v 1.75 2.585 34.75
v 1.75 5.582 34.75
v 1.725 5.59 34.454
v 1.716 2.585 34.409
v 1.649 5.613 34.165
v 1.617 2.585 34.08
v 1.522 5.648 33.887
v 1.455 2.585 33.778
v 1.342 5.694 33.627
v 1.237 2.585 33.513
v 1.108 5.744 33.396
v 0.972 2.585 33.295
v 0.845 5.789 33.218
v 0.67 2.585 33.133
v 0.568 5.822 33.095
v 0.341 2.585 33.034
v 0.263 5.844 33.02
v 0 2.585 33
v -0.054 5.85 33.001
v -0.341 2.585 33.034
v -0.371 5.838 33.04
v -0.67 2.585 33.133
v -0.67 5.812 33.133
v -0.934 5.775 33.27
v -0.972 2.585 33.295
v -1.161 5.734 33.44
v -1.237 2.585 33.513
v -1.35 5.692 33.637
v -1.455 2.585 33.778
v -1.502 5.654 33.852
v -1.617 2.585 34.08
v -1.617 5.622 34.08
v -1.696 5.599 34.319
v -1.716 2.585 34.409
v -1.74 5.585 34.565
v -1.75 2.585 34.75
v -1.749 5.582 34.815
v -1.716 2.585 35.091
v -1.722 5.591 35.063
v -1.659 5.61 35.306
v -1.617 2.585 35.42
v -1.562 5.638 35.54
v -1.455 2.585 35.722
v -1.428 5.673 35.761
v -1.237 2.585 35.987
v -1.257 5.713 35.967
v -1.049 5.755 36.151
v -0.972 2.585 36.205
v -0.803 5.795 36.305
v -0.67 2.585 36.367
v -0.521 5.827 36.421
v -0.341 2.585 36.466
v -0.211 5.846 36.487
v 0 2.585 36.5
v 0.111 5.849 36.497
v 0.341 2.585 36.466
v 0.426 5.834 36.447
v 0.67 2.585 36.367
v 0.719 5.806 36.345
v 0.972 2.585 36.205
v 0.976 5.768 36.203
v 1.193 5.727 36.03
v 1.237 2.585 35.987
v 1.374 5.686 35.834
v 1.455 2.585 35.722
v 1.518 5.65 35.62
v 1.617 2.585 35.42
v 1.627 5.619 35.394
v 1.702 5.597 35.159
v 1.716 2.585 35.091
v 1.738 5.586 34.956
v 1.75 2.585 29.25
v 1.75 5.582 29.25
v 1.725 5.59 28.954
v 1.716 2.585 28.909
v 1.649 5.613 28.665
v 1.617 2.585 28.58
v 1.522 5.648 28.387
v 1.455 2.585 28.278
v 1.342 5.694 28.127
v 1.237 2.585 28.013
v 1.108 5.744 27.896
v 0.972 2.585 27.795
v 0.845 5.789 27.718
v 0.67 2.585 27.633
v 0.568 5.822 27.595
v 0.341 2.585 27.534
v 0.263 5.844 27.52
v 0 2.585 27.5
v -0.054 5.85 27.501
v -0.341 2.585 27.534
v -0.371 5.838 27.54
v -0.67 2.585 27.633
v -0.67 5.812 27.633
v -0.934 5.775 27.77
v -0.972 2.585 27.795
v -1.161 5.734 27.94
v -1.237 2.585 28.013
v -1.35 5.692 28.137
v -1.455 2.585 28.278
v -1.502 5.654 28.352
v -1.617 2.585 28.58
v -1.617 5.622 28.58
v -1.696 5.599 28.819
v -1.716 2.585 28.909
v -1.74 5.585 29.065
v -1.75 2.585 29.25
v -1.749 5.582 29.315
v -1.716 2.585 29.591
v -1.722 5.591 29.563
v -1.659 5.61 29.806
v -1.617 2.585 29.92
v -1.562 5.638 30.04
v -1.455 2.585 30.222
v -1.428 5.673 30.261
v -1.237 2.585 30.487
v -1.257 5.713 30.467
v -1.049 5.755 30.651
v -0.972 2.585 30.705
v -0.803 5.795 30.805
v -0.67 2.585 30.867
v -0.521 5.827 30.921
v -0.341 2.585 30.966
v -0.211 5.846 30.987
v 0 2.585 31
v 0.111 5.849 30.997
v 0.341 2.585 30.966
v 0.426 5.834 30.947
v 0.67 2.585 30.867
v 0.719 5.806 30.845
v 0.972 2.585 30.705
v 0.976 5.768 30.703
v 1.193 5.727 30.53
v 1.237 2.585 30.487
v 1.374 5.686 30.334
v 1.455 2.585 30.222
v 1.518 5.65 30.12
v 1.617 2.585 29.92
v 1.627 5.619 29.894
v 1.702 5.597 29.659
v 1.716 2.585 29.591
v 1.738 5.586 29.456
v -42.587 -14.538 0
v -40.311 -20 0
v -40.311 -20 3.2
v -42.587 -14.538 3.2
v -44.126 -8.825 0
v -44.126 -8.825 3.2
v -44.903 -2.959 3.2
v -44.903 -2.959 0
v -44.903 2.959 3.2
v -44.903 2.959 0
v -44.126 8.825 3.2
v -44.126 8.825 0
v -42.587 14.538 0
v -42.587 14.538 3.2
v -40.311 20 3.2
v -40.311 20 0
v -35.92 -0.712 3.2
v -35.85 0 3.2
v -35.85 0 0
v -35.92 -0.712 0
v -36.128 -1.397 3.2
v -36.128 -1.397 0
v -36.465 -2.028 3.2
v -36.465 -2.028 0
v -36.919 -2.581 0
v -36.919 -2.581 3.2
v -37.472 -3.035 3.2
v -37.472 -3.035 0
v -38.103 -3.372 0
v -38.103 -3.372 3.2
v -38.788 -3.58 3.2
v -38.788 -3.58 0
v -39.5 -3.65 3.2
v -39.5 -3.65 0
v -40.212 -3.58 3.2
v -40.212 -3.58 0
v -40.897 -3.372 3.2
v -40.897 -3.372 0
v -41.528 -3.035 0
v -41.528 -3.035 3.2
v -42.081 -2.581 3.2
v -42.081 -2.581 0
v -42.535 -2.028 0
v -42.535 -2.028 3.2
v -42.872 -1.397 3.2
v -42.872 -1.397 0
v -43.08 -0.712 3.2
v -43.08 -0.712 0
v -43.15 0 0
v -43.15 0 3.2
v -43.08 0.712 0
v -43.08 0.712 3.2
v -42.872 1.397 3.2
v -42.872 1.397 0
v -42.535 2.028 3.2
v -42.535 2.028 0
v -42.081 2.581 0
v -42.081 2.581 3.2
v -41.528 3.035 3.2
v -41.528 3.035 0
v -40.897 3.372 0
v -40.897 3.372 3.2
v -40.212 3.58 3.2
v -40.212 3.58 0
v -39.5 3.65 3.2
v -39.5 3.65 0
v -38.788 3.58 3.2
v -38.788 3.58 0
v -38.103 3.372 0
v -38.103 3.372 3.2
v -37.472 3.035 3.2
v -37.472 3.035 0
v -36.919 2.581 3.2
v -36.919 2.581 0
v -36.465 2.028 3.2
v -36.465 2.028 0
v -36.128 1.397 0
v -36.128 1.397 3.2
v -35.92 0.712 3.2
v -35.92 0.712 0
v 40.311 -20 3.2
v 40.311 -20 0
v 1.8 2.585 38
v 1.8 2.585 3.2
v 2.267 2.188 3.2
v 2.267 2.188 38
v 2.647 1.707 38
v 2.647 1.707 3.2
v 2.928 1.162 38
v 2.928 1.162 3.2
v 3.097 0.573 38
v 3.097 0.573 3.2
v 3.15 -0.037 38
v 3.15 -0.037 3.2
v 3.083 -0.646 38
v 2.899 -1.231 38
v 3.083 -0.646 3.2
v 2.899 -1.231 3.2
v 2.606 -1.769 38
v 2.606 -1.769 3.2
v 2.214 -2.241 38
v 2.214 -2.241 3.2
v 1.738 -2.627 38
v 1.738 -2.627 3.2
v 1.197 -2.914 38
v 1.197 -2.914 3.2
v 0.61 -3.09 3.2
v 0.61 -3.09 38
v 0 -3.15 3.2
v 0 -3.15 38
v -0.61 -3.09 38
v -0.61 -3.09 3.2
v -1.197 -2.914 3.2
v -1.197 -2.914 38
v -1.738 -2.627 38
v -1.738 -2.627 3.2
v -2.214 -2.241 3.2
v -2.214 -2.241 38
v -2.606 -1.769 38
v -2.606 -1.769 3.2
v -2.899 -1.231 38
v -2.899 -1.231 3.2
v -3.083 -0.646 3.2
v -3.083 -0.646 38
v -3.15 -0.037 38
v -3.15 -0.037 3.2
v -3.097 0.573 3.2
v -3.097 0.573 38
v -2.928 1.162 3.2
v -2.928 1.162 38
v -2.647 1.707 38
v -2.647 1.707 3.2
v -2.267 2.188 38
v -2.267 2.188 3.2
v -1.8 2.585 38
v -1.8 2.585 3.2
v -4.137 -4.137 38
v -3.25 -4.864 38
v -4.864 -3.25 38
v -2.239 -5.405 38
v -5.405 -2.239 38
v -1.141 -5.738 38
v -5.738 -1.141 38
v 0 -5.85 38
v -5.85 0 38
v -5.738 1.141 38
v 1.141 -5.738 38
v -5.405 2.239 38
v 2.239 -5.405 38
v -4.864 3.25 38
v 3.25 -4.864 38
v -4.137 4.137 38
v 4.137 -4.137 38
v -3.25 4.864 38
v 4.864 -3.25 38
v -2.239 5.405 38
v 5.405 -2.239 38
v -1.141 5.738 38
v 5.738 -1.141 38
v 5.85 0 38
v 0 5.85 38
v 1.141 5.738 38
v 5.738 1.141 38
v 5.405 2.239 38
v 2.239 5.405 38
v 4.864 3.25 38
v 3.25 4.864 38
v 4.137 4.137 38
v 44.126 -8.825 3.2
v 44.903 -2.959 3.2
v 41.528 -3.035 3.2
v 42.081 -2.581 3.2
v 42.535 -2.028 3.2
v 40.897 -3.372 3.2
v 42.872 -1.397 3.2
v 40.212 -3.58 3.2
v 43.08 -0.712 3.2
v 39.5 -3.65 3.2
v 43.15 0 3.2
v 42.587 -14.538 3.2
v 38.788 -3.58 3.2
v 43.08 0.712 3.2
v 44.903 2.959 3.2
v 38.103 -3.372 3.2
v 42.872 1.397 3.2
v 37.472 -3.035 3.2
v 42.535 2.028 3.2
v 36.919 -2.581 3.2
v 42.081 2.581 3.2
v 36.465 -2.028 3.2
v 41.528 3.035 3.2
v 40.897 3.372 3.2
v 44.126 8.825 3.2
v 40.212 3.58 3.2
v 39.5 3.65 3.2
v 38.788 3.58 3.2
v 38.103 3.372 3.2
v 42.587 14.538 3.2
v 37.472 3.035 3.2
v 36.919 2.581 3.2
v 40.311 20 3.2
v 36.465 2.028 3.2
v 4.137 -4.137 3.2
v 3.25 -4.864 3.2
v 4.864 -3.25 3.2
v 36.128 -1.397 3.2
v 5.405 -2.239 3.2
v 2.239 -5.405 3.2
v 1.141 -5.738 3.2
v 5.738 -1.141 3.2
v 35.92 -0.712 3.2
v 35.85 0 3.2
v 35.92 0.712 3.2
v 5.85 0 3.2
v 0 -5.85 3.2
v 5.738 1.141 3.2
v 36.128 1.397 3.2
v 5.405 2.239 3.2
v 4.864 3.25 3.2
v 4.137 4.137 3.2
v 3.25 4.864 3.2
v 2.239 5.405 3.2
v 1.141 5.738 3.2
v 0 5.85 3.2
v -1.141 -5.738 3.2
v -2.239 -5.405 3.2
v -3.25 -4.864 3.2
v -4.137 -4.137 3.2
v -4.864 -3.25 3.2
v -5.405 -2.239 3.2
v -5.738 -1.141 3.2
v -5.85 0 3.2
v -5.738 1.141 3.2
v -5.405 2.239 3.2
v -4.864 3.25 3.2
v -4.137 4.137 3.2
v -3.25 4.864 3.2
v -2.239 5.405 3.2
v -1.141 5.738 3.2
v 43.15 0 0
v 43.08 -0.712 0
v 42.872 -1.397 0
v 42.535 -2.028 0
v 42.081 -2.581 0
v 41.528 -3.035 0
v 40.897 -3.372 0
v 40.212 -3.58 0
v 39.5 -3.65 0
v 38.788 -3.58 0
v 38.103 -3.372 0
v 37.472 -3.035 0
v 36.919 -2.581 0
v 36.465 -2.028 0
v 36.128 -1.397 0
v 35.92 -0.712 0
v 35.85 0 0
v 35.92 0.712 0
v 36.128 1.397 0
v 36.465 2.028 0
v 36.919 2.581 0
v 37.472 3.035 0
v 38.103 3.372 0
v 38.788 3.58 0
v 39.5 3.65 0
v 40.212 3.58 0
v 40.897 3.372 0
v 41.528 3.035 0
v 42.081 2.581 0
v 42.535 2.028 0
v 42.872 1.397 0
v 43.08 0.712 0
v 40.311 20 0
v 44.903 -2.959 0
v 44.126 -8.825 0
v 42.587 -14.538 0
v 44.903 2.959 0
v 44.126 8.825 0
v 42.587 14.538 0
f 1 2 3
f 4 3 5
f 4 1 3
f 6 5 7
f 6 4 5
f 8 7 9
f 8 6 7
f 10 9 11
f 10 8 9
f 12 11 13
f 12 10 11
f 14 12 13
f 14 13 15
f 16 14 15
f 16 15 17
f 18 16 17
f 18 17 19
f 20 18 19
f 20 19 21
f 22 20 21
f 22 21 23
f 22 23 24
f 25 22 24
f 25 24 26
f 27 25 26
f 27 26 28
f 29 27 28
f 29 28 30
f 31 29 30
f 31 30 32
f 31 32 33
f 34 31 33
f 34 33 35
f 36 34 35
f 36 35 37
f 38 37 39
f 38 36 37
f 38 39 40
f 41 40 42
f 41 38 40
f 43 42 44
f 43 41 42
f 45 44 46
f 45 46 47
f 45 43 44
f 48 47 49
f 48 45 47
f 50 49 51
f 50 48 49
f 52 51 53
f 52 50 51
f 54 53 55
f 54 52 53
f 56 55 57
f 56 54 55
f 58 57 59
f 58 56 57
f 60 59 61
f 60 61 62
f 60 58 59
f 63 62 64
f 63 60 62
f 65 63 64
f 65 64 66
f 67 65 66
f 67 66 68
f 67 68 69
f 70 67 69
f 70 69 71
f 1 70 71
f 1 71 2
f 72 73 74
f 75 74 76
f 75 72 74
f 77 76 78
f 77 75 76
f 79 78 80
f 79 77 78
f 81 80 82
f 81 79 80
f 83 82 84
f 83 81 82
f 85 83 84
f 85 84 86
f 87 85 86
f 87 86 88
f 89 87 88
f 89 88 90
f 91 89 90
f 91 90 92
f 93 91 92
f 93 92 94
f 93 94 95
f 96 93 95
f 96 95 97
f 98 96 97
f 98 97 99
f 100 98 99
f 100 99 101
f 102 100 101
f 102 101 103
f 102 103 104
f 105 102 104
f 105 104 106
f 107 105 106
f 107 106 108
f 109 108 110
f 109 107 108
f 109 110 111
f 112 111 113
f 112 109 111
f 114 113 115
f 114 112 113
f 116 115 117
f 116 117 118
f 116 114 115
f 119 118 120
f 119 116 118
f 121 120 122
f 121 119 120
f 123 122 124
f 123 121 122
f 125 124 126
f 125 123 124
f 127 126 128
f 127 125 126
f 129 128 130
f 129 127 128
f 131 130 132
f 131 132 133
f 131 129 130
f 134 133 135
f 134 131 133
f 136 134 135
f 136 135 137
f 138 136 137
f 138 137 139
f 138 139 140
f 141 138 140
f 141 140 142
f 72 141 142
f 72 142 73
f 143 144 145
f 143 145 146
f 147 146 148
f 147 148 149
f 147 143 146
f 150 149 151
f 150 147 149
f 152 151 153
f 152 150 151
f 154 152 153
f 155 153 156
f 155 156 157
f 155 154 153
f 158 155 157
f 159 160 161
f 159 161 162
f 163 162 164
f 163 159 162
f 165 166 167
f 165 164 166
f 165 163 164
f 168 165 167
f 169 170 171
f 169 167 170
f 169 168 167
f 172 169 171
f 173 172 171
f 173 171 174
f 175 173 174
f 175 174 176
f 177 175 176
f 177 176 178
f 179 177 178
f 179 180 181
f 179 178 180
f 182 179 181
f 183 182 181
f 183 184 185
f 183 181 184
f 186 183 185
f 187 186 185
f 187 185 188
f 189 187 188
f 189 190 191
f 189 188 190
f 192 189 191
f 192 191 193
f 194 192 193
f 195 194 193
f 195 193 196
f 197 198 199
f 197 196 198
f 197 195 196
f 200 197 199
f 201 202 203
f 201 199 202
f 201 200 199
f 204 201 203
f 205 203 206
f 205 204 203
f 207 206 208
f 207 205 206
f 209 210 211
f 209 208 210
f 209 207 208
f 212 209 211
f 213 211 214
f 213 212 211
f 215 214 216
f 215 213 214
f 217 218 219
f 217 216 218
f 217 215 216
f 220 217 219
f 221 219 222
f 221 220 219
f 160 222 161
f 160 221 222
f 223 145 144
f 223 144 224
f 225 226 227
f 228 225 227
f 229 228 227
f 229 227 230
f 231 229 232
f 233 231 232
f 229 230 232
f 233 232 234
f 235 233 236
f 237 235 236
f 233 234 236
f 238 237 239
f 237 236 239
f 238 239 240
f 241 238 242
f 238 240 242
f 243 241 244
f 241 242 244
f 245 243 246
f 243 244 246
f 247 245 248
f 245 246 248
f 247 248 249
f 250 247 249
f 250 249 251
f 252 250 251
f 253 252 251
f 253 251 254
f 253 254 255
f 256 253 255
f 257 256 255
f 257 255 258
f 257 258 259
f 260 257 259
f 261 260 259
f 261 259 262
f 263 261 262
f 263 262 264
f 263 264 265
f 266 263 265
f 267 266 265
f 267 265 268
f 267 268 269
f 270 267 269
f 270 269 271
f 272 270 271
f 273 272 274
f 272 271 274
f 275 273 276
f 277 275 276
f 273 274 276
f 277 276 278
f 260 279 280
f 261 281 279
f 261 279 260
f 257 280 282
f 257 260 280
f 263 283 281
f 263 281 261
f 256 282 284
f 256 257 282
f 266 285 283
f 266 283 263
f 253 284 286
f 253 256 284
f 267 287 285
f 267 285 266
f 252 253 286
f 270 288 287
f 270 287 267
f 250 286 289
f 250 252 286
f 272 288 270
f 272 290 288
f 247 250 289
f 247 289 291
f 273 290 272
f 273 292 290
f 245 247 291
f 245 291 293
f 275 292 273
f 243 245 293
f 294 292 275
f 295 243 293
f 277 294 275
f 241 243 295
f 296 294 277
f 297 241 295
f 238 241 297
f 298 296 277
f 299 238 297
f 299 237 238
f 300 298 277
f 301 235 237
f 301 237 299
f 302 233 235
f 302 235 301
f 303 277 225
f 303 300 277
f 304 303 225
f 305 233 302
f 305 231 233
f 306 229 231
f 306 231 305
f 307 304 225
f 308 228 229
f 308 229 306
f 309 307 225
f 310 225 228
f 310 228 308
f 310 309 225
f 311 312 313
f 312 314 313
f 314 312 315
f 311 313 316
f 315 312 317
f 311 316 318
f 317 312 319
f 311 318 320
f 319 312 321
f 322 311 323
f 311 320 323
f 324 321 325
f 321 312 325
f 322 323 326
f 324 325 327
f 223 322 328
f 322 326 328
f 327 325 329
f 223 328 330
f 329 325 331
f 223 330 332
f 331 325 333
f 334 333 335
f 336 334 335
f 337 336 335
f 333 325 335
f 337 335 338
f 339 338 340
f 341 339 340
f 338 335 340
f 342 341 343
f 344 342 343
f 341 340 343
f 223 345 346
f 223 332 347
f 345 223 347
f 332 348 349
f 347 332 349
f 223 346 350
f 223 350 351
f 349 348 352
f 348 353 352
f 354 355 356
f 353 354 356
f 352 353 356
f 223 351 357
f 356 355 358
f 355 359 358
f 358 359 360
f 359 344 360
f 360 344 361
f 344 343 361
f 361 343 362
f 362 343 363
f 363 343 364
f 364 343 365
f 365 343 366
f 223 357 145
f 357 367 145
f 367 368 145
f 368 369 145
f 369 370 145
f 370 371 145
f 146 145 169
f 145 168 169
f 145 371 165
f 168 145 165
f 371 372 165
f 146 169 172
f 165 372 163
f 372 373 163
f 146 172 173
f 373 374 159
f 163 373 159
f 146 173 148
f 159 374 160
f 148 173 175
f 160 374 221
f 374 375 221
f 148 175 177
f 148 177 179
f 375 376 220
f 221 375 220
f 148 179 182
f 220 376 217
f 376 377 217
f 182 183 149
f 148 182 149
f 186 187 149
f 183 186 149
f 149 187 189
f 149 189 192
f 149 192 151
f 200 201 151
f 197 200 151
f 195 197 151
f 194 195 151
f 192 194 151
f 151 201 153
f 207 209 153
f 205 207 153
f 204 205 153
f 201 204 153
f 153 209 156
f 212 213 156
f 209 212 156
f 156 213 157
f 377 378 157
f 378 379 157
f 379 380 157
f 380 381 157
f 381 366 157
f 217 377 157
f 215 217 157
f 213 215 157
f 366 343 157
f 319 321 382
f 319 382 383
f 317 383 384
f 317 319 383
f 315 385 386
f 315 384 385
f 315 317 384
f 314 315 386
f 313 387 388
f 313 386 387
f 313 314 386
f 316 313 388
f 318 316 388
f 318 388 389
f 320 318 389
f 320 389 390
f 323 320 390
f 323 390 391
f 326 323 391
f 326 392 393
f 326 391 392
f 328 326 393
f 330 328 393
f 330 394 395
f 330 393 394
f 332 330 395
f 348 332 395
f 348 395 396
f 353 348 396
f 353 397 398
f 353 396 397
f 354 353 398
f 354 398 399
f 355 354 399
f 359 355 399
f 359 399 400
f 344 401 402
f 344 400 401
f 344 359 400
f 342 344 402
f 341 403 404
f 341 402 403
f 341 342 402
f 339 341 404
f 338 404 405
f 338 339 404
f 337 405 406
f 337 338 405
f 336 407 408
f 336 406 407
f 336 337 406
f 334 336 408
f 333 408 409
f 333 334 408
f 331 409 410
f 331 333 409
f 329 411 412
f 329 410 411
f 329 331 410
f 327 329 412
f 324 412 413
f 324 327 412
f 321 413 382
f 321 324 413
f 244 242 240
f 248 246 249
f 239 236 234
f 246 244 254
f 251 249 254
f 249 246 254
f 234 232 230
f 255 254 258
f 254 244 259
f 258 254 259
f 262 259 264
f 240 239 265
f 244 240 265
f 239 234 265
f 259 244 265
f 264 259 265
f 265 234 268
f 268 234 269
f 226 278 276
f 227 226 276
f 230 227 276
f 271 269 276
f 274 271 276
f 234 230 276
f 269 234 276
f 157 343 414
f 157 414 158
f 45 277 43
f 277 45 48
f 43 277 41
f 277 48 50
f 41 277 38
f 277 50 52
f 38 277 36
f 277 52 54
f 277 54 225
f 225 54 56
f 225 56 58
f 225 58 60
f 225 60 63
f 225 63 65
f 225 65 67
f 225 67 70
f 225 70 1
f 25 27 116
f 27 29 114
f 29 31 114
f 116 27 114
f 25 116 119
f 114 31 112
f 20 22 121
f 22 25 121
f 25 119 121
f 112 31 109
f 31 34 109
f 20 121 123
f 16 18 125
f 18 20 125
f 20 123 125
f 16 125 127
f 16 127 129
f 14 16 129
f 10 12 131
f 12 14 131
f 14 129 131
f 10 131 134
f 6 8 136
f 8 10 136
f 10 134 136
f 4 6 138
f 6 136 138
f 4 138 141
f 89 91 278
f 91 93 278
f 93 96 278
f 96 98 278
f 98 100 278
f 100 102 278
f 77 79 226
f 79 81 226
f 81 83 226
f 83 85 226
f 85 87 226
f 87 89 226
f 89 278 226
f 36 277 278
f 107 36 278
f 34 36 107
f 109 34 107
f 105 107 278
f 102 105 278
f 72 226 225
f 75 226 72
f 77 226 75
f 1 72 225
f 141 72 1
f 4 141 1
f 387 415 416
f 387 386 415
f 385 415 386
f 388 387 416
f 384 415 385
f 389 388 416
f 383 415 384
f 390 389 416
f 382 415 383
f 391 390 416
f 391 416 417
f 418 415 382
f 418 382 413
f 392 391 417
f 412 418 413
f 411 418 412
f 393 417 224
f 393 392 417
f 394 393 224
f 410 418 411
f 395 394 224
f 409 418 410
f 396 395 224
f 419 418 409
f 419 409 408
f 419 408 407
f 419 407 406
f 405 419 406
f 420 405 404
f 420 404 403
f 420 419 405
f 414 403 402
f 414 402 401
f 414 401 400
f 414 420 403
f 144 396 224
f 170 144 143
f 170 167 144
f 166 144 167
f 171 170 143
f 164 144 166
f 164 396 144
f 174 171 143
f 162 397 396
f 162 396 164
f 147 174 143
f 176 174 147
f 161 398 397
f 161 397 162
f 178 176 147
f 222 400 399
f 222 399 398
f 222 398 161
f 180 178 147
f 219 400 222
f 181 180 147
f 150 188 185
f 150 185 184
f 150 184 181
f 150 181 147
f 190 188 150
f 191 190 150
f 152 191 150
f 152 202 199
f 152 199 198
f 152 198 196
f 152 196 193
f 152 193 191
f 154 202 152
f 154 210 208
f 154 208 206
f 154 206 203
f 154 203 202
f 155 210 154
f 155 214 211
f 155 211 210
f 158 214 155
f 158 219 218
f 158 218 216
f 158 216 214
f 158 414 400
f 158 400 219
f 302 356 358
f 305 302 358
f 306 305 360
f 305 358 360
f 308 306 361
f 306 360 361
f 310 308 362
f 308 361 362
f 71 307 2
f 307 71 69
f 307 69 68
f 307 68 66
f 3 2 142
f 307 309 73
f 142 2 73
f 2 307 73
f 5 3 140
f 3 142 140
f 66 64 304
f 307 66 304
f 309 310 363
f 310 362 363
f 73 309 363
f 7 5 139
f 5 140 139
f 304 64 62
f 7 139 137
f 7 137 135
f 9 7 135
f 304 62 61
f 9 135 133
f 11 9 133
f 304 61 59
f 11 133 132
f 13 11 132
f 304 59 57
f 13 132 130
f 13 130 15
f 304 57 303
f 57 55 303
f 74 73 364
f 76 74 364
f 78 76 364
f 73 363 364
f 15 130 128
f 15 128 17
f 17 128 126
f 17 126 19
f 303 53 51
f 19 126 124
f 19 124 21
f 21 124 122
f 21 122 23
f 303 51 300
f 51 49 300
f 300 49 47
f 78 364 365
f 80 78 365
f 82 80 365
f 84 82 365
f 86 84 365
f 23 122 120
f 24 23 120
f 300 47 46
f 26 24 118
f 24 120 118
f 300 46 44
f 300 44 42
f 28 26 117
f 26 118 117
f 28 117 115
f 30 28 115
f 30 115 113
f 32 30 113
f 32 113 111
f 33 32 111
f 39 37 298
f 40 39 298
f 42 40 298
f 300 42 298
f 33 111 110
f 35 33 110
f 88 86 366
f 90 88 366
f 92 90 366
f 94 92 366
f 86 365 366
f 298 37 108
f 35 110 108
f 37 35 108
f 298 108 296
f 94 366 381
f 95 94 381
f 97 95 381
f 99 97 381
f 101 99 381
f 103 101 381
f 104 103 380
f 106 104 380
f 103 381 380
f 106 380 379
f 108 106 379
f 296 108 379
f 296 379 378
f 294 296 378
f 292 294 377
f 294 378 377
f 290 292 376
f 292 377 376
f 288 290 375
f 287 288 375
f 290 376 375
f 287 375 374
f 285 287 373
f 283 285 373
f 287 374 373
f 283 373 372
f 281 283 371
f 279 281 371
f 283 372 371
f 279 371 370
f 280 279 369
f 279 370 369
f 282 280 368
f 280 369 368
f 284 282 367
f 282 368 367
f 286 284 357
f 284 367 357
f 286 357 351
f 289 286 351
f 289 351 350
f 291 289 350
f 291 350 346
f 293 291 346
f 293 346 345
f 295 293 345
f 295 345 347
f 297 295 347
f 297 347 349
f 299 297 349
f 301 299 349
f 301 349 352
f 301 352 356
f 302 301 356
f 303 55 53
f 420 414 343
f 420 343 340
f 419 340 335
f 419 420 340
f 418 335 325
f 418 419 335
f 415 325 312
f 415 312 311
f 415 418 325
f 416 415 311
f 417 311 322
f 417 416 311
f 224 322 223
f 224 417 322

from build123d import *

# Parameters (mm, degrees)
CROQUIS1_R                 = 5.85
SALIENTE_EXTRUIR1_DEPTH    = 38
CROQUIS2_R                 = 1.75
CORTAR_EXTRUIR1_DEPTH      = 7.5
CROQUIS3_R                 = 45
SALIENTE_EXTRUIR2_DEPTH    = 3.2
CORTAR_EXTRUIR2_DEPTH      = 75.121521892
CORTAR_EXTRUIR2_DEPTH_BACK = 5
CROQUIS5_R                 = 3.65


with BuildPart() as part:
    # Croquis1 → Saliente-Extruir1 (new body)
    with BuildSketch(Plane.XY):
        Circle(CROQUIS1_R)
        with BuildLine():
            Line((-1.8, 2.585053191), (1.8, 2.585053191))
            ThreePointArc((1.8, 2.585053191), (0, -3.15), (-1.8, 2.585053191))
        make_face(mode=Mode.SUBTRACT)
    extrude(amount=SALIENTE_EXTRUIR1_DEPTH)

    # Croquis2 → Cortar-Extruir1 (cut)
    with BuildSketch(Plane(origin=(0, 2.585053191, 0), x_dir=(1, 0, 0), z_dir=(0, 1, 0))):
        with Locations((0, -34.75)):
            Circle(CROQUIS2_R)
        with Locations((0, -29.25)):
            Circle(CROQUIS2_R)
    extrude(amount=CORTAR_EXTRUIR1_DEPTH, mode=Mode.SUBTRACT)

    # Croquis3 → Saliente-Extruir2 (add)
    with BuildSketch(Plane(origin=(0, 0, 0), x_dir=(-1, 0, 0), z_dir=(0, 0, -1))):
        Circle(CROQUIS3_R)
    extrude(amount=-SALIENTE_EXTRUIR2_DEPTH)

    # Croquis5 → Cortar-Extruir2 (cut, two sides: drawn at the far end of the back side and taken through both)
    with BuildSketch(Plane(origin=(0, 0, 0), x_dir=(-1, 0, 0), z_dir=(0, 0, -1)).offset(-CORTAR_EXTRUIR2_DEPTH_BACK)):
        with Locations(Location((-39.5, 0, 0), (0, 0, 180))):
            Circle(CROQUIS5_R)
        with Locations(Location((39.5, 0, 0), (0, 0, 180))):
            Circle(CROQUIS5_R)
        Polygon((0, 20), (-75, 20), (-75, 50), (75, 50), (75, 20), align=None)
        Polygon((75, -50), (75, -20), (0, -20), (-75, -20), (-75, -50), align=None)
    extrude(amount=CORTAR_EXTRUIR2_DEPTH + CORTAR_EXTRUIR2_DEPTH_BACK, mode=Mode.SUBTRACT)


solid = part.part
